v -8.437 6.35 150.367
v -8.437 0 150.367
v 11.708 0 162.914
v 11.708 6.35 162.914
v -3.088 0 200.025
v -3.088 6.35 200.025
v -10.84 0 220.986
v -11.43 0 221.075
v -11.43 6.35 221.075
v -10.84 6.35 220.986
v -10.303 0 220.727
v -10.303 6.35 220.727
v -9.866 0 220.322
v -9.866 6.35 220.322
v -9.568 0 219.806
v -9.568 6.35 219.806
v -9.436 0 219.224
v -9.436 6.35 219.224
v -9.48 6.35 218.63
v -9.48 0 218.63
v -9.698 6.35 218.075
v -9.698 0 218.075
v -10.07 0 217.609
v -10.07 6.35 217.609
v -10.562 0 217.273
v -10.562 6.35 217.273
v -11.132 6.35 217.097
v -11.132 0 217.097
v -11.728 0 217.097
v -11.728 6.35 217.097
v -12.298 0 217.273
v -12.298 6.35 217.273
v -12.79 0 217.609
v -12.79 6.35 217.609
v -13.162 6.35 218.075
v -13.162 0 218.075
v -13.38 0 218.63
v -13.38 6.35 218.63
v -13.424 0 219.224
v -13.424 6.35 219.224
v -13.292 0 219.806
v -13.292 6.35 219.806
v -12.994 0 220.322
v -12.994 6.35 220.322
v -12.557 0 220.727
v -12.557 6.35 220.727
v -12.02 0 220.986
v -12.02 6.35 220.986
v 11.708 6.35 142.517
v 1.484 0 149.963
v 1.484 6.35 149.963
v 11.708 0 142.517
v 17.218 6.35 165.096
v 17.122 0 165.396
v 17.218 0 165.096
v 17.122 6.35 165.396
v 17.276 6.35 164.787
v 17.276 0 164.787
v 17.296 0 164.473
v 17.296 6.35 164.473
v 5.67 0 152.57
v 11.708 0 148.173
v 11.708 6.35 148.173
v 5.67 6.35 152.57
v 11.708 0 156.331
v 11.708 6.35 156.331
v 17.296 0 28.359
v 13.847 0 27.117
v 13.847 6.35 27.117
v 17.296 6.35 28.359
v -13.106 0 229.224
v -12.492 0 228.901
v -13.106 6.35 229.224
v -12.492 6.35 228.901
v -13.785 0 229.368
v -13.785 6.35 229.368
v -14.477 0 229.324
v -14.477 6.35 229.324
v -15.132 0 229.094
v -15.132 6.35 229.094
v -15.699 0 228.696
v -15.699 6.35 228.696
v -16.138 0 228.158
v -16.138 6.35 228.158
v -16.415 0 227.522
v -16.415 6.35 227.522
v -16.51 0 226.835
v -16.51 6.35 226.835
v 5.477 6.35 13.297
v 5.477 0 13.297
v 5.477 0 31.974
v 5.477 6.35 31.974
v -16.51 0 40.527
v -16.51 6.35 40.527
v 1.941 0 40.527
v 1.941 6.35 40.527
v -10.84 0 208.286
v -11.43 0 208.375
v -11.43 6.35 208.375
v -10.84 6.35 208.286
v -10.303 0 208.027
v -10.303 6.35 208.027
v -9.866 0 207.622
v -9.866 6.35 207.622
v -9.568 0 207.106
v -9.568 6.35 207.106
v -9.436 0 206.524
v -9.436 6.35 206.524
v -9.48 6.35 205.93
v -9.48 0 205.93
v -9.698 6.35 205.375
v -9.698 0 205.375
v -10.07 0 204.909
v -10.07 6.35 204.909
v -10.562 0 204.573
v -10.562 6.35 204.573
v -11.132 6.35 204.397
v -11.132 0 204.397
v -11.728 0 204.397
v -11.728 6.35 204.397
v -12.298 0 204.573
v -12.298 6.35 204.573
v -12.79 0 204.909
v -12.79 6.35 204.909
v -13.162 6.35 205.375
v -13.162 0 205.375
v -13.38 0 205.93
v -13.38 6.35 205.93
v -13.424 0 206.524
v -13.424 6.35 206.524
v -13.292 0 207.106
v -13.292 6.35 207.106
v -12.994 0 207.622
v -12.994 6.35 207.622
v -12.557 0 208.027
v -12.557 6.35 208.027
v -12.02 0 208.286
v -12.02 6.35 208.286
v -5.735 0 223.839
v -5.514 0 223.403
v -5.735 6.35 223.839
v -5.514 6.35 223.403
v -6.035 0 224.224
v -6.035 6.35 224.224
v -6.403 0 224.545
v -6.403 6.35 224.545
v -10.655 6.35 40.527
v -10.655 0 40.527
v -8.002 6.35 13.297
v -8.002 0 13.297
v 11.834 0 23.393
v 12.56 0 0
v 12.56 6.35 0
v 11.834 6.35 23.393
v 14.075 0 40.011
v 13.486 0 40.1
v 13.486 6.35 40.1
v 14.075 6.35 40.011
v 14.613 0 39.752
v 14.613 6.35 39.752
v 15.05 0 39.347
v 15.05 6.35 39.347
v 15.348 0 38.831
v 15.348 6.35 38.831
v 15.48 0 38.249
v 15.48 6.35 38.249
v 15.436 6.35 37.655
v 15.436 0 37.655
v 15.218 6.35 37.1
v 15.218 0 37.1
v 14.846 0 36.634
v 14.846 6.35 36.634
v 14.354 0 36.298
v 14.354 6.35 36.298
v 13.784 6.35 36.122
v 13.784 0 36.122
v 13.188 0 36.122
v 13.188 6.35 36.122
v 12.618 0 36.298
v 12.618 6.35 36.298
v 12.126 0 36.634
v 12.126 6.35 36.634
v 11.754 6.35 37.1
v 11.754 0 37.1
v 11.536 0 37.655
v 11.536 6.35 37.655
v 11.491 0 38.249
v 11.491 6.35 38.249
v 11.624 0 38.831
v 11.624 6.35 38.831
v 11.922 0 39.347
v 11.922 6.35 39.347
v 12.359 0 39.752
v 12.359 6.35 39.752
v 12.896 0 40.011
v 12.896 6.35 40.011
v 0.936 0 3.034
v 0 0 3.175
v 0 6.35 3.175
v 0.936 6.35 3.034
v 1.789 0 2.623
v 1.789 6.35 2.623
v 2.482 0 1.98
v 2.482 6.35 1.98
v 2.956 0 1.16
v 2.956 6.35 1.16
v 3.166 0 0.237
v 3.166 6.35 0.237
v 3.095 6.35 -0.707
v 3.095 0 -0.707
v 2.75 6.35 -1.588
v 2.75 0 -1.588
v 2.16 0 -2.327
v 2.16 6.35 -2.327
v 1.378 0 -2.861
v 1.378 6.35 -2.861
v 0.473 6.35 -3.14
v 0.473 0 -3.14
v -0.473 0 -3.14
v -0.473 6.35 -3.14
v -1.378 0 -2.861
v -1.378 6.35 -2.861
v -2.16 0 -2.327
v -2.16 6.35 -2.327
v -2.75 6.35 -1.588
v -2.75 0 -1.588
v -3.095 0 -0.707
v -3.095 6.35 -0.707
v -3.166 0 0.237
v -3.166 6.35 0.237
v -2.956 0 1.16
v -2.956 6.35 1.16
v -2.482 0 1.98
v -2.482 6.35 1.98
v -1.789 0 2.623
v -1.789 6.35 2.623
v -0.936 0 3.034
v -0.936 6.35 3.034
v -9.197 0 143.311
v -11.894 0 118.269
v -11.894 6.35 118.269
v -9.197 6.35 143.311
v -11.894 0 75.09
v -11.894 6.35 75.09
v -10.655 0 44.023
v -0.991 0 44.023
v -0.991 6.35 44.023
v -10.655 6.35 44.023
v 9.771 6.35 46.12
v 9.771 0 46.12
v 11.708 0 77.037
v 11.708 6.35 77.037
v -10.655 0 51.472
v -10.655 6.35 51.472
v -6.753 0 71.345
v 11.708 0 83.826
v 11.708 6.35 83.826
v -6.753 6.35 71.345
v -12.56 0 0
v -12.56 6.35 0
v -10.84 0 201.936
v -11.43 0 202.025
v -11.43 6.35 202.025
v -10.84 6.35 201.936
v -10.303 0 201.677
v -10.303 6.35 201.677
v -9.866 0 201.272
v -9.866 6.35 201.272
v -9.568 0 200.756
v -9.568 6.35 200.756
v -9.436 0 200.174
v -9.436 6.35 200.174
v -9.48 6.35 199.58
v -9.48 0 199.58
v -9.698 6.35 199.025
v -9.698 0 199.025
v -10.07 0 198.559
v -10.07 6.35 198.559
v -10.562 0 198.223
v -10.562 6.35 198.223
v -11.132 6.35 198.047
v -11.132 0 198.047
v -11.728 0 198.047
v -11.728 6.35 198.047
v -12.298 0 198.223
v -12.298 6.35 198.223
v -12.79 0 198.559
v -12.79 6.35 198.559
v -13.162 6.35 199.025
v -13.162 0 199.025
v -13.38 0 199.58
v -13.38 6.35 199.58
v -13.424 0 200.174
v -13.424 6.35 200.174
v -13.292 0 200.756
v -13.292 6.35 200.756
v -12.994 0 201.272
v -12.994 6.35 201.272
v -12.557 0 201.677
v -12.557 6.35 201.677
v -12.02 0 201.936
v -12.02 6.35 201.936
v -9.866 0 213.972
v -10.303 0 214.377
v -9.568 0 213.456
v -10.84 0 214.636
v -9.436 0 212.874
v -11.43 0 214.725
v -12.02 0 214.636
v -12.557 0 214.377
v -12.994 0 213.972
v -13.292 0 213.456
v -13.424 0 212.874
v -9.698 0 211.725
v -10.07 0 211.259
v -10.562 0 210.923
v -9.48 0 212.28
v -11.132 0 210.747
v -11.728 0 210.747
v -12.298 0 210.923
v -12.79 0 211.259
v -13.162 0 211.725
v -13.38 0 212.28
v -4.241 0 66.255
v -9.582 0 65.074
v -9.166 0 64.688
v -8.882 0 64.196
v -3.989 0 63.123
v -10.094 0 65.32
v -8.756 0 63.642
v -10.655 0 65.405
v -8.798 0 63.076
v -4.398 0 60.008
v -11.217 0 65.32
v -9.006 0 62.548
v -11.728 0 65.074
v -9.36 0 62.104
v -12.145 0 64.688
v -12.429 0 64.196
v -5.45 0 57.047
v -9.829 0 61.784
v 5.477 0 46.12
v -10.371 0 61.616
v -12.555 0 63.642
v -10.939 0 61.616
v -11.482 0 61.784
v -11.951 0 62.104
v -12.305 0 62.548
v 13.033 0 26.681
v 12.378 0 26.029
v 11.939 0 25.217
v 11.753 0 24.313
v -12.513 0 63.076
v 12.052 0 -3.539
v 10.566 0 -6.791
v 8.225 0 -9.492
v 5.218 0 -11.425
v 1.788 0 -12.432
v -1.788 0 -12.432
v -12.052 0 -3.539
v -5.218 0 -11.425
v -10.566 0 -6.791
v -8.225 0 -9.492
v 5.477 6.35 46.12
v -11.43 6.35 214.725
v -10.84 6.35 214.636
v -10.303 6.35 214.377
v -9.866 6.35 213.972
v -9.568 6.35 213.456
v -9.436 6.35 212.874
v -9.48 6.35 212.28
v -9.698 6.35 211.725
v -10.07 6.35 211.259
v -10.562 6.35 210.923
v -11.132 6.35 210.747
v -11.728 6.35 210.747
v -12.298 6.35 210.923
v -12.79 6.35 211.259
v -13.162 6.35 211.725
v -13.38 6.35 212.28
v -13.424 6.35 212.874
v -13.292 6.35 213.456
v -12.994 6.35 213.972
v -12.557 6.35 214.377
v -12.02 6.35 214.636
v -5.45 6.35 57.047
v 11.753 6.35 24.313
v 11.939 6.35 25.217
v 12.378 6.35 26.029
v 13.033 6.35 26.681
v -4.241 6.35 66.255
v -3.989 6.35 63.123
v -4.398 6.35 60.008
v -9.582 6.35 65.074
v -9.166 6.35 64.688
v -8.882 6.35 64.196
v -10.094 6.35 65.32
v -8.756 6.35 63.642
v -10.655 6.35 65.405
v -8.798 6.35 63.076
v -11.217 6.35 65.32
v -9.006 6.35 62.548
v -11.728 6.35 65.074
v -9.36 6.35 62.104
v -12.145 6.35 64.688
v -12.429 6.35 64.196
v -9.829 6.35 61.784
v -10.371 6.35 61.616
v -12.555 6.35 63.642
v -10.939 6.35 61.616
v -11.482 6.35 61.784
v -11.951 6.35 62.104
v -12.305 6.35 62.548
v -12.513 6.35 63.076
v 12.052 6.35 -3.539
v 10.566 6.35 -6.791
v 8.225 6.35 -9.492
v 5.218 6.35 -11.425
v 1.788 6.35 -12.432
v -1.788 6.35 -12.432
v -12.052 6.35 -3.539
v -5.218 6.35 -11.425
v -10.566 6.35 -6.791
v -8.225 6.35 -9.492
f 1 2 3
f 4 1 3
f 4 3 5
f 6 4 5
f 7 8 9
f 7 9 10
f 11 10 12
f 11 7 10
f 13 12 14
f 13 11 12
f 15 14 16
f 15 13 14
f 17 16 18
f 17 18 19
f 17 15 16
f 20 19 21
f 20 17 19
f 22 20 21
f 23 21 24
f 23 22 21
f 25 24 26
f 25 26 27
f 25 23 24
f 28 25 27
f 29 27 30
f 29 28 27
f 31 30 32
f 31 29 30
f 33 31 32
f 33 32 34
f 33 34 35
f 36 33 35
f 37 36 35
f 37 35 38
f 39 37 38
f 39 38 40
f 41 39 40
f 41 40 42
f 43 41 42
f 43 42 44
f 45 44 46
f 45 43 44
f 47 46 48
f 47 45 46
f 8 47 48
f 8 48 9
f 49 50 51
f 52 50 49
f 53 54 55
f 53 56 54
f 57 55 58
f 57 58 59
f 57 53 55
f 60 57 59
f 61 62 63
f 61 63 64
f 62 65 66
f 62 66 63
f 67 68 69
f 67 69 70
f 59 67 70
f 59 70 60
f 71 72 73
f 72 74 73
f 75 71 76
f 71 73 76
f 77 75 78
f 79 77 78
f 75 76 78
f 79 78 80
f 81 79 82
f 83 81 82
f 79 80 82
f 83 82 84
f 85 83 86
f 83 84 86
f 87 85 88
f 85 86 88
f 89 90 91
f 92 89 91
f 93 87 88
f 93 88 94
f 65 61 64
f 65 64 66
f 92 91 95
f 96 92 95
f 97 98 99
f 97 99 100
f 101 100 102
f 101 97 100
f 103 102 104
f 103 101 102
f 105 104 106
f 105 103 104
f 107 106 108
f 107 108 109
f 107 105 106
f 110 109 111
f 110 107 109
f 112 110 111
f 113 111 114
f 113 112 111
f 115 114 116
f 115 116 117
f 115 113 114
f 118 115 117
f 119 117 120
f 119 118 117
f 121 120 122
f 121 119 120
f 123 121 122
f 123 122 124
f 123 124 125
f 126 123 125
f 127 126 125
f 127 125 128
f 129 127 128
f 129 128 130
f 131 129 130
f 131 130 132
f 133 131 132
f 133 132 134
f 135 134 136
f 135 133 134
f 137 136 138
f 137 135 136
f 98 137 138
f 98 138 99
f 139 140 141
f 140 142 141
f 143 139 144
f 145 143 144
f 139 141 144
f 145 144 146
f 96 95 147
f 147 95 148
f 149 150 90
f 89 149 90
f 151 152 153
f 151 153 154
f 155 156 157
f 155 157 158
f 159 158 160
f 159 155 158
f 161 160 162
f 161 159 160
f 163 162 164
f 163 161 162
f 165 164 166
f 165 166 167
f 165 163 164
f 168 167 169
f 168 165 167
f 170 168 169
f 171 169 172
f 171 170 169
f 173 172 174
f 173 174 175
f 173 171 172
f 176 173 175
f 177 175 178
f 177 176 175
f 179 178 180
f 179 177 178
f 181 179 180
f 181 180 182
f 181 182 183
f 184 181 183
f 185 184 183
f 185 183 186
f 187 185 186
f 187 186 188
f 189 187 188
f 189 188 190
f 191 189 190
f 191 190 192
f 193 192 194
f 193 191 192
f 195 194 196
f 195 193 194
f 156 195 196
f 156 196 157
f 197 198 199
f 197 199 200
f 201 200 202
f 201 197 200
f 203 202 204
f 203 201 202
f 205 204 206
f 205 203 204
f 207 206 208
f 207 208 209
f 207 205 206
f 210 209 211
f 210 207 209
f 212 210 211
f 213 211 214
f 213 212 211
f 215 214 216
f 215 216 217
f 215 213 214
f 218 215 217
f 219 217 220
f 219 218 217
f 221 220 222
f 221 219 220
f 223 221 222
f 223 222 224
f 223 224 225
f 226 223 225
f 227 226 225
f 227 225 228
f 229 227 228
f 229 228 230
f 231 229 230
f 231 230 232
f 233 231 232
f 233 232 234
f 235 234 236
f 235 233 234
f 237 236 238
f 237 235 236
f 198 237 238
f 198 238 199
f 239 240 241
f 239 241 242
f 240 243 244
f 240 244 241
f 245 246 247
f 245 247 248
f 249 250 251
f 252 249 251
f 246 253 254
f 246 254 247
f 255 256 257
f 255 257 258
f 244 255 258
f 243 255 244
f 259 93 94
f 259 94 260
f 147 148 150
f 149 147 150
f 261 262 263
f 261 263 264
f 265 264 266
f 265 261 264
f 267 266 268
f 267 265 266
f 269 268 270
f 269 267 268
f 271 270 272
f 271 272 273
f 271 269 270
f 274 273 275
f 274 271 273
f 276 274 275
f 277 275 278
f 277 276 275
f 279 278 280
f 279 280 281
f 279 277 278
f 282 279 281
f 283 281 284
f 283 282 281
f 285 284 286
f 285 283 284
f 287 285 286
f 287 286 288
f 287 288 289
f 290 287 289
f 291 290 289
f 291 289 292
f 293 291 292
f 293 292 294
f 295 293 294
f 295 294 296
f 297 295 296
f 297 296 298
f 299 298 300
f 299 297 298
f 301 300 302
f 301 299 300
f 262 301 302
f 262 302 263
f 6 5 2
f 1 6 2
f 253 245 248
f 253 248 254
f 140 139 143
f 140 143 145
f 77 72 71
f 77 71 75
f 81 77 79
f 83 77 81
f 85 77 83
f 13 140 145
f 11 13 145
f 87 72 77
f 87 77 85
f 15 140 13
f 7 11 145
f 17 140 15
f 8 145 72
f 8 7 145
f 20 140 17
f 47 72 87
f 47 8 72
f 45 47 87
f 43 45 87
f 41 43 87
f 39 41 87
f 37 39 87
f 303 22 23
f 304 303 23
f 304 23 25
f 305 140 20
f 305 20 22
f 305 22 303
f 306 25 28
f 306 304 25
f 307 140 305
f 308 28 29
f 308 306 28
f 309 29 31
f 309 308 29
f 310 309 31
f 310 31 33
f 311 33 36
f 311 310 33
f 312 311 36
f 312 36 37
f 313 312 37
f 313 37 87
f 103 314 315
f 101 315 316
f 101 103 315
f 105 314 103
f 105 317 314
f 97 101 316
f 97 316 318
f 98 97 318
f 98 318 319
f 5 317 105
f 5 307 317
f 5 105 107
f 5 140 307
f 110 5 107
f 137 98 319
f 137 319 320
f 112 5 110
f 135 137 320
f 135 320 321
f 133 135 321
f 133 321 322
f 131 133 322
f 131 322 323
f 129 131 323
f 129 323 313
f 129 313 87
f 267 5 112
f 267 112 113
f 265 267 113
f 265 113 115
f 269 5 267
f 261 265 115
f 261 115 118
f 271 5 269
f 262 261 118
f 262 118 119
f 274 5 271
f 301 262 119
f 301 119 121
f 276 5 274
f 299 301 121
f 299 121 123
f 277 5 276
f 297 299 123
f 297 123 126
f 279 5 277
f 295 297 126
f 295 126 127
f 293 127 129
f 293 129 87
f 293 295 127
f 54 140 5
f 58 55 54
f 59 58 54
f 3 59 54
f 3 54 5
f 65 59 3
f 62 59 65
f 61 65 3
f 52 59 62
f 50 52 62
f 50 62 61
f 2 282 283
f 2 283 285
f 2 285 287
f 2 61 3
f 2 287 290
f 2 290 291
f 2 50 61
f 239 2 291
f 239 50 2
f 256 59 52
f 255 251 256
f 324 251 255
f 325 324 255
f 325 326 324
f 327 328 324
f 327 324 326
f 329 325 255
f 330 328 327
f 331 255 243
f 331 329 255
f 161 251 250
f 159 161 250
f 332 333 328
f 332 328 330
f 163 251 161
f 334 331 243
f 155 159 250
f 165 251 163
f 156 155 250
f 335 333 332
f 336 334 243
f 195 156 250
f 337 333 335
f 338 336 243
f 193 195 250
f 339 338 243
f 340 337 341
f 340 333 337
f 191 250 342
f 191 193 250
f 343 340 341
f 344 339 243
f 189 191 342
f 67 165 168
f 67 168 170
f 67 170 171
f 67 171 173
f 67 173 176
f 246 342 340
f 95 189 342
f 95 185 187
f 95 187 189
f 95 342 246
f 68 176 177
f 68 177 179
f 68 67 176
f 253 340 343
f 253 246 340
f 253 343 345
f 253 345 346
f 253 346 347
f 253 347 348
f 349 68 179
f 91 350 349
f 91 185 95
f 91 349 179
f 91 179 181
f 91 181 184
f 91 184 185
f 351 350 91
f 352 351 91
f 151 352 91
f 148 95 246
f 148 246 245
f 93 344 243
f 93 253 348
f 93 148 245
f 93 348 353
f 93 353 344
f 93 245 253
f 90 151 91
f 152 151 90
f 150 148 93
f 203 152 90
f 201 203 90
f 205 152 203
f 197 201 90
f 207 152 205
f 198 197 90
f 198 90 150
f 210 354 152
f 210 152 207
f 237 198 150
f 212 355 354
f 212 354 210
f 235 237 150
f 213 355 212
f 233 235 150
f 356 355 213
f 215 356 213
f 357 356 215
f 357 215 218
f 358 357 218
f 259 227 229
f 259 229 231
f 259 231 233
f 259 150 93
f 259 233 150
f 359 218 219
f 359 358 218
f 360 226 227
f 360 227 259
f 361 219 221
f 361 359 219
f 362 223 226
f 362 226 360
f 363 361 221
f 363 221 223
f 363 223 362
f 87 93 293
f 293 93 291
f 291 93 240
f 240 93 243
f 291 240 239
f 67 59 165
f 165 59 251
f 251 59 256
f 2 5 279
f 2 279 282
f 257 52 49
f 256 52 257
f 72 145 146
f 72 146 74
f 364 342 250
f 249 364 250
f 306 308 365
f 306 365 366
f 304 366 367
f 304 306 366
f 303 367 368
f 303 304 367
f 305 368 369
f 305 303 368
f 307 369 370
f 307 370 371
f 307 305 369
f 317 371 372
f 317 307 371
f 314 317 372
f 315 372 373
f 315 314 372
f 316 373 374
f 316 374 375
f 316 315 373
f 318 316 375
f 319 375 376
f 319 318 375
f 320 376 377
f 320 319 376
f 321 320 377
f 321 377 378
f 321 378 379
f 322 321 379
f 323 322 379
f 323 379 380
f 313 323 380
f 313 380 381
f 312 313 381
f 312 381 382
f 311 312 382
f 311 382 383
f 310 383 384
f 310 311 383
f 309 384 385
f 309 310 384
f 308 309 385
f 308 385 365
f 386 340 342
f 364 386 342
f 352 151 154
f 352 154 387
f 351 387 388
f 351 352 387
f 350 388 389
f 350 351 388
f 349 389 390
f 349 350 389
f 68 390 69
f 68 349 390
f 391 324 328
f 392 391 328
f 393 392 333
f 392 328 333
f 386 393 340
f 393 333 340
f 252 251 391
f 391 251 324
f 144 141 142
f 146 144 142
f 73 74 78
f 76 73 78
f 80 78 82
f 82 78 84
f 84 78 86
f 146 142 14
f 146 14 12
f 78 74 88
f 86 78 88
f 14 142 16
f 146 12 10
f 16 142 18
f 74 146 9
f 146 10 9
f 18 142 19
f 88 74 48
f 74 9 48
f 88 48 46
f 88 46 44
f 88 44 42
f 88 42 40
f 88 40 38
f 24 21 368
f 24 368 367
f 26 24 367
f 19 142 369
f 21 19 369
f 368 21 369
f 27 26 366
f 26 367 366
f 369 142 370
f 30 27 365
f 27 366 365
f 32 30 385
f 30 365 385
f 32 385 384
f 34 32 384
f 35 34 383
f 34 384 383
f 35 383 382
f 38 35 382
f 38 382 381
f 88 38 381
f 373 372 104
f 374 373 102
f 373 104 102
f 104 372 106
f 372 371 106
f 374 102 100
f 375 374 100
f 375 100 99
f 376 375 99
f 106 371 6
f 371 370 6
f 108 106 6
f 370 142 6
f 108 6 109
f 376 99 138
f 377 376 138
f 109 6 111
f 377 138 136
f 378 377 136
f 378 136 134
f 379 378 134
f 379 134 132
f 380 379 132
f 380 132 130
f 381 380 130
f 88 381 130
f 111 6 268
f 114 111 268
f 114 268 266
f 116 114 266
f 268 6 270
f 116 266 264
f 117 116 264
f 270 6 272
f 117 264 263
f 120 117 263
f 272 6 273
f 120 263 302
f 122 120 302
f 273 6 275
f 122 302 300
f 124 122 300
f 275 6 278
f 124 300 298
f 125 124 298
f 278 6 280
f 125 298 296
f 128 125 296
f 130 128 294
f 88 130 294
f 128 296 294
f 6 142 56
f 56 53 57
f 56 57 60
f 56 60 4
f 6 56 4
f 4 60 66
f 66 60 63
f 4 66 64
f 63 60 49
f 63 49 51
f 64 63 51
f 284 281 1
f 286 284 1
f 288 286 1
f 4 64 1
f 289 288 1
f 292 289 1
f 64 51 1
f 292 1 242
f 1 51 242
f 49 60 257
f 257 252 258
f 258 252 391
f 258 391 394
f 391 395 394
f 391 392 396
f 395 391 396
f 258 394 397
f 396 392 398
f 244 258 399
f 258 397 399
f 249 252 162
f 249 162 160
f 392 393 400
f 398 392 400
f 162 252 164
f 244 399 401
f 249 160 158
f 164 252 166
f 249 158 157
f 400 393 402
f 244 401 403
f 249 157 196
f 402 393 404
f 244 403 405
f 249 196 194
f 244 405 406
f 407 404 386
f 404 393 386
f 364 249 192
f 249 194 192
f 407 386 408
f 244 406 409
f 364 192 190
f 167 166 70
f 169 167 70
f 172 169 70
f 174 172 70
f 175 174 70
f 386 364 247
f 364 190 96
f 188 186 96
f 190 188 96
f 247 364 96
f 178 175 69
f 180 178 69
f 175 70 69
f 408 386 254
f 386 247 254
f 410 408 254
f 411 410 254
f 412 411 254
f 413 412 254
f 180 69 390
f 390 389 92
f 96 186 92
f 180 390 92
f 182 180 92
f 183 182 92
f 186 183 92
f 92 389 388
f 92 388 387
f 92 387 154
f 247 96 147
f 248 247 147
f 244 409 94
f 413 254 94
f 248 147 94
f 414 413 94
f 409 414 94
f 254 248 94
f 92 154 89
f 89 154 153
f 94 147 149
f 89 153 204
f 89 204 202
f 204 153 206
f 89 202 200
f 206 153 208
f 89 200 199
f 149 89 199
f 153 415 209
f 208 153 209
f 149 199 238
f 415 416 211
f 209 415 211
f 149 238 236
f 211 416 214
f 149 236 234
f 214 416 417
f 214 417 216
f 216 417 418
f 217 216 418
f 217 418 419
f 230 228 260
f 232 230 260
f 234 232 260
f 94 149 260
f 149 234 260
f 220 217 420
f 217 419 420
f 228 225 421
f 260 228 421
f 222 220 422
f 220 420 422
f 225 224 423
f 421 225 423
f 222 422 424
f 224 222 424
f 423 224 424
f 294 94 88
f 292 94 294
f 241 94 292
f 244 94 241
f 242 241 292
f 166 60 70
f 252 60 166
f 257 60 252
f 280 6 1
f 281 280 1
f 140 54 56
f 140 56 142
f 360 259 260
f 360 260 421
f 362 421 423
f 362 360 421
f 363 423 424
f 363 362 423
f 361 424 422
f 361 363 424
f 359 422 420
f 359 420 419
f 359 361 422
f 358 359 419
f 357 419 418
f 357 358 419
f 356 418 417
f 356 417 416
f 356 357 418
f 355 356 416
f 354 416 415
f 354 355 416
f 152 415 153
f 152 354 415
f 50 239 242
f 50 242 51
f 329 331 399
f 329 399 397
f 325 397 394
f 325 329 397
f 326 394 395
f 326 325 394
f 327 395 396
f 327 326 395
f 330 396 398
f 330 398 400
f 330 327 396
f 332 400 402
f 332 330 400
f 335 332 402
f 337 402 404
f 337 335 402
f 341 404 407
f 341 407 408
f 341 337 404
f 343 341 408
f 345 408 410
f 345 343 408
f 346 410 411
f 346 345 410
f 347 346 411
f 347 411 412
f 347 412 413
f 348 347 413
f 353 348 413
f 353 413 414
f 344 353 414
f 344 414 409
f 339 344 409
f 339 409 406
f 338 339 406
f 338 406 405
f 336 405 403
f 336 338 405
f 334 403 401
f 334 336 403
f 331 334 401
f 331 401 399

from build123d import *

# Parameters (mm, degrees)
SKETCH2_R           = 3.175
SKETCH2_R_2         = 2
SKETCH2_R_3         = 1.905
SKETCH2_R_4         = 1.999999991
BOSS_EXTRUDE1_DEPTH = 6.35
FILLET3_R           = 2.54
FILLET4_R           = 2.54
FILLET5_R           = 2.54


with BuildPart() as part:
    # Sketch2 → Boss-Extrude1 (new body)
    with BuildSketch(Plane(origin=(0, 0, 0), x_dir=(1, 0, 0), z_dir=(0, 1, 0))):
        with BuildLine():
            Line((13.846627418, -27.11715969), (17.295902343, -28.359470371))
            Line((17.295902343, -28.359470371), (17.295902343, -164.950770806))
            Line((17.295902343, -164.950770806), (-5.788689103, -224.106088723))
            Line((-5.788689103, -224.106088723), (-16.51, -231.775))
            Line((-16.51, -231.775), (-16.51, -118.11))
            Line((-16.51, -118.11), (-16.51, -40.527182032))
            Line((-16.51, -40.527182032), (-12.5603, 0))
            ThreePointArc((-12.5603, 0), (0, 12.5603), (12.5603, 0))
            Line((12.5603, 0), (11.834308479, -23.392641285))
            ThreePointArc((11.834308479, -23.392641285), (12.129138804, -25.639224299), (13.846627418, -27.11715969))
        make_face()
        with Locations(Location((0, 0, 0), (0, 0, 270))):
            Circle(SKETCH2_R, mode=Mode.SUBTRACT)
        with Locations(Location((-11.43, -219.075, 0), (0, 0, 270))):
            Circle(SKETCH2_R_2, mode=Mode.SUBTRACT)
        with Locations(Location((-11.43, -212.725, 0), (0, 0, 270))):
            Circle(SKETCH2_R_2, mode=Mode.SUBTRACT)
        with Locations(Location((-11.43, -206.375, 0), (0, 0, 270))):
            Circle(SKETCH2_R_2, mode=Mode.SUBTRACT)
        with Locations(Location((-11.43, -200.025, 0), (0, 0, 270))):
            Circle(SKETCH2_R_2, mode=Mode.SUBTRACT)
        with Locations(Location((-10.6553, -63.5, 0), (0, 0, 270))):
            Circle(SKETCH2_R_3, mode=Mode.SUBTRACT)
        with Locations(Location((13.485902343, -38.1, 0), (0, 0, 270))):
            Circle(SKETCH2_R_4, mode=Mode.SUBTRACT)
        Polygon((-3.088444979, -200.025), (-8.437091633, -150.367410486), (11.707902343, -162.914359455), align=None, mode=Mode.SUBTRACT)
        Polygon((5.669829362, -152.570430441), (11.707902343, -156.331136136), (11.707902343, -148.173239335), align=None, mode=Mode.SUBTRACT)
        Polygon((-9.197164207, -143.310789567), (1.48362655, -149.963128939), (11.707902343, -142.517360277), (11.707902343, -83.82613362), (-6.752611098, -71.345410911), (-11.894481361, -75.089947663), (-11.894481361, -118.268516882), align=None, mode=Mode.SUBTRACT)
        with BuildLine():
            Line((-5.45038708, -57.047318199), (5.477174601, -46.119756518))
            Line((5.477174601, -46.119756518), (9.770631453, -46.119756518))
            Line((9.770631453, -46.119756518), (11.707902343, -77.037423395))
            Line((11.707902343, -77.037423395), (-4.240626345, -66.254995008))
            ThreePointArc((-4.240626345, -66.254995008), (-4.111536449, -61.554723114), (-5.45038708, -57.047318199))
        make_face(mode=Mode.SUBTRACT)
        Polygon((-10.6553, -40.527182032), (-8.00152211, -13.297230483), (5.477174601, -13.297230483), (5.477174601, -31.974105906), (1.94113758, -40.527182032), align=None, mode=Mode.SUBTRACT)
        Polygon((-10.6553, -44.022777243), (-10.6553, -51.472145687), (-0.991335505, -44.022777243), align=None, mode=Mode.SUBTRACT)
    extrude(amount=BOSS_EXTRUDE1_DEPTH)

    # Fillet3
    fillet3_edges = [part.edges().sort_by_distance(p)[0] for p in [
        (-5.788689103, 3.175, 224.106088723),
    ]]
    fillet(fillet3_edges, radius=FILLET3_R)

    # Fillet4
    fillet4_edges = [part.edges().sort_by_distance(p)[0] for p in [
        (-16.51, 3.175, 231.775),
    ]]
    fillet(fillet4_edges, radius=FILLET4_R)

    # Fillet5
    fillet5_edges = [part.edges().sort_by_distance(p)[0] for p in [
        (17.295902343, 3.175, 164.950770806),
    ]]
    fillet(fillet5_edges, radius=FILLET5_R)


solid = part.part
